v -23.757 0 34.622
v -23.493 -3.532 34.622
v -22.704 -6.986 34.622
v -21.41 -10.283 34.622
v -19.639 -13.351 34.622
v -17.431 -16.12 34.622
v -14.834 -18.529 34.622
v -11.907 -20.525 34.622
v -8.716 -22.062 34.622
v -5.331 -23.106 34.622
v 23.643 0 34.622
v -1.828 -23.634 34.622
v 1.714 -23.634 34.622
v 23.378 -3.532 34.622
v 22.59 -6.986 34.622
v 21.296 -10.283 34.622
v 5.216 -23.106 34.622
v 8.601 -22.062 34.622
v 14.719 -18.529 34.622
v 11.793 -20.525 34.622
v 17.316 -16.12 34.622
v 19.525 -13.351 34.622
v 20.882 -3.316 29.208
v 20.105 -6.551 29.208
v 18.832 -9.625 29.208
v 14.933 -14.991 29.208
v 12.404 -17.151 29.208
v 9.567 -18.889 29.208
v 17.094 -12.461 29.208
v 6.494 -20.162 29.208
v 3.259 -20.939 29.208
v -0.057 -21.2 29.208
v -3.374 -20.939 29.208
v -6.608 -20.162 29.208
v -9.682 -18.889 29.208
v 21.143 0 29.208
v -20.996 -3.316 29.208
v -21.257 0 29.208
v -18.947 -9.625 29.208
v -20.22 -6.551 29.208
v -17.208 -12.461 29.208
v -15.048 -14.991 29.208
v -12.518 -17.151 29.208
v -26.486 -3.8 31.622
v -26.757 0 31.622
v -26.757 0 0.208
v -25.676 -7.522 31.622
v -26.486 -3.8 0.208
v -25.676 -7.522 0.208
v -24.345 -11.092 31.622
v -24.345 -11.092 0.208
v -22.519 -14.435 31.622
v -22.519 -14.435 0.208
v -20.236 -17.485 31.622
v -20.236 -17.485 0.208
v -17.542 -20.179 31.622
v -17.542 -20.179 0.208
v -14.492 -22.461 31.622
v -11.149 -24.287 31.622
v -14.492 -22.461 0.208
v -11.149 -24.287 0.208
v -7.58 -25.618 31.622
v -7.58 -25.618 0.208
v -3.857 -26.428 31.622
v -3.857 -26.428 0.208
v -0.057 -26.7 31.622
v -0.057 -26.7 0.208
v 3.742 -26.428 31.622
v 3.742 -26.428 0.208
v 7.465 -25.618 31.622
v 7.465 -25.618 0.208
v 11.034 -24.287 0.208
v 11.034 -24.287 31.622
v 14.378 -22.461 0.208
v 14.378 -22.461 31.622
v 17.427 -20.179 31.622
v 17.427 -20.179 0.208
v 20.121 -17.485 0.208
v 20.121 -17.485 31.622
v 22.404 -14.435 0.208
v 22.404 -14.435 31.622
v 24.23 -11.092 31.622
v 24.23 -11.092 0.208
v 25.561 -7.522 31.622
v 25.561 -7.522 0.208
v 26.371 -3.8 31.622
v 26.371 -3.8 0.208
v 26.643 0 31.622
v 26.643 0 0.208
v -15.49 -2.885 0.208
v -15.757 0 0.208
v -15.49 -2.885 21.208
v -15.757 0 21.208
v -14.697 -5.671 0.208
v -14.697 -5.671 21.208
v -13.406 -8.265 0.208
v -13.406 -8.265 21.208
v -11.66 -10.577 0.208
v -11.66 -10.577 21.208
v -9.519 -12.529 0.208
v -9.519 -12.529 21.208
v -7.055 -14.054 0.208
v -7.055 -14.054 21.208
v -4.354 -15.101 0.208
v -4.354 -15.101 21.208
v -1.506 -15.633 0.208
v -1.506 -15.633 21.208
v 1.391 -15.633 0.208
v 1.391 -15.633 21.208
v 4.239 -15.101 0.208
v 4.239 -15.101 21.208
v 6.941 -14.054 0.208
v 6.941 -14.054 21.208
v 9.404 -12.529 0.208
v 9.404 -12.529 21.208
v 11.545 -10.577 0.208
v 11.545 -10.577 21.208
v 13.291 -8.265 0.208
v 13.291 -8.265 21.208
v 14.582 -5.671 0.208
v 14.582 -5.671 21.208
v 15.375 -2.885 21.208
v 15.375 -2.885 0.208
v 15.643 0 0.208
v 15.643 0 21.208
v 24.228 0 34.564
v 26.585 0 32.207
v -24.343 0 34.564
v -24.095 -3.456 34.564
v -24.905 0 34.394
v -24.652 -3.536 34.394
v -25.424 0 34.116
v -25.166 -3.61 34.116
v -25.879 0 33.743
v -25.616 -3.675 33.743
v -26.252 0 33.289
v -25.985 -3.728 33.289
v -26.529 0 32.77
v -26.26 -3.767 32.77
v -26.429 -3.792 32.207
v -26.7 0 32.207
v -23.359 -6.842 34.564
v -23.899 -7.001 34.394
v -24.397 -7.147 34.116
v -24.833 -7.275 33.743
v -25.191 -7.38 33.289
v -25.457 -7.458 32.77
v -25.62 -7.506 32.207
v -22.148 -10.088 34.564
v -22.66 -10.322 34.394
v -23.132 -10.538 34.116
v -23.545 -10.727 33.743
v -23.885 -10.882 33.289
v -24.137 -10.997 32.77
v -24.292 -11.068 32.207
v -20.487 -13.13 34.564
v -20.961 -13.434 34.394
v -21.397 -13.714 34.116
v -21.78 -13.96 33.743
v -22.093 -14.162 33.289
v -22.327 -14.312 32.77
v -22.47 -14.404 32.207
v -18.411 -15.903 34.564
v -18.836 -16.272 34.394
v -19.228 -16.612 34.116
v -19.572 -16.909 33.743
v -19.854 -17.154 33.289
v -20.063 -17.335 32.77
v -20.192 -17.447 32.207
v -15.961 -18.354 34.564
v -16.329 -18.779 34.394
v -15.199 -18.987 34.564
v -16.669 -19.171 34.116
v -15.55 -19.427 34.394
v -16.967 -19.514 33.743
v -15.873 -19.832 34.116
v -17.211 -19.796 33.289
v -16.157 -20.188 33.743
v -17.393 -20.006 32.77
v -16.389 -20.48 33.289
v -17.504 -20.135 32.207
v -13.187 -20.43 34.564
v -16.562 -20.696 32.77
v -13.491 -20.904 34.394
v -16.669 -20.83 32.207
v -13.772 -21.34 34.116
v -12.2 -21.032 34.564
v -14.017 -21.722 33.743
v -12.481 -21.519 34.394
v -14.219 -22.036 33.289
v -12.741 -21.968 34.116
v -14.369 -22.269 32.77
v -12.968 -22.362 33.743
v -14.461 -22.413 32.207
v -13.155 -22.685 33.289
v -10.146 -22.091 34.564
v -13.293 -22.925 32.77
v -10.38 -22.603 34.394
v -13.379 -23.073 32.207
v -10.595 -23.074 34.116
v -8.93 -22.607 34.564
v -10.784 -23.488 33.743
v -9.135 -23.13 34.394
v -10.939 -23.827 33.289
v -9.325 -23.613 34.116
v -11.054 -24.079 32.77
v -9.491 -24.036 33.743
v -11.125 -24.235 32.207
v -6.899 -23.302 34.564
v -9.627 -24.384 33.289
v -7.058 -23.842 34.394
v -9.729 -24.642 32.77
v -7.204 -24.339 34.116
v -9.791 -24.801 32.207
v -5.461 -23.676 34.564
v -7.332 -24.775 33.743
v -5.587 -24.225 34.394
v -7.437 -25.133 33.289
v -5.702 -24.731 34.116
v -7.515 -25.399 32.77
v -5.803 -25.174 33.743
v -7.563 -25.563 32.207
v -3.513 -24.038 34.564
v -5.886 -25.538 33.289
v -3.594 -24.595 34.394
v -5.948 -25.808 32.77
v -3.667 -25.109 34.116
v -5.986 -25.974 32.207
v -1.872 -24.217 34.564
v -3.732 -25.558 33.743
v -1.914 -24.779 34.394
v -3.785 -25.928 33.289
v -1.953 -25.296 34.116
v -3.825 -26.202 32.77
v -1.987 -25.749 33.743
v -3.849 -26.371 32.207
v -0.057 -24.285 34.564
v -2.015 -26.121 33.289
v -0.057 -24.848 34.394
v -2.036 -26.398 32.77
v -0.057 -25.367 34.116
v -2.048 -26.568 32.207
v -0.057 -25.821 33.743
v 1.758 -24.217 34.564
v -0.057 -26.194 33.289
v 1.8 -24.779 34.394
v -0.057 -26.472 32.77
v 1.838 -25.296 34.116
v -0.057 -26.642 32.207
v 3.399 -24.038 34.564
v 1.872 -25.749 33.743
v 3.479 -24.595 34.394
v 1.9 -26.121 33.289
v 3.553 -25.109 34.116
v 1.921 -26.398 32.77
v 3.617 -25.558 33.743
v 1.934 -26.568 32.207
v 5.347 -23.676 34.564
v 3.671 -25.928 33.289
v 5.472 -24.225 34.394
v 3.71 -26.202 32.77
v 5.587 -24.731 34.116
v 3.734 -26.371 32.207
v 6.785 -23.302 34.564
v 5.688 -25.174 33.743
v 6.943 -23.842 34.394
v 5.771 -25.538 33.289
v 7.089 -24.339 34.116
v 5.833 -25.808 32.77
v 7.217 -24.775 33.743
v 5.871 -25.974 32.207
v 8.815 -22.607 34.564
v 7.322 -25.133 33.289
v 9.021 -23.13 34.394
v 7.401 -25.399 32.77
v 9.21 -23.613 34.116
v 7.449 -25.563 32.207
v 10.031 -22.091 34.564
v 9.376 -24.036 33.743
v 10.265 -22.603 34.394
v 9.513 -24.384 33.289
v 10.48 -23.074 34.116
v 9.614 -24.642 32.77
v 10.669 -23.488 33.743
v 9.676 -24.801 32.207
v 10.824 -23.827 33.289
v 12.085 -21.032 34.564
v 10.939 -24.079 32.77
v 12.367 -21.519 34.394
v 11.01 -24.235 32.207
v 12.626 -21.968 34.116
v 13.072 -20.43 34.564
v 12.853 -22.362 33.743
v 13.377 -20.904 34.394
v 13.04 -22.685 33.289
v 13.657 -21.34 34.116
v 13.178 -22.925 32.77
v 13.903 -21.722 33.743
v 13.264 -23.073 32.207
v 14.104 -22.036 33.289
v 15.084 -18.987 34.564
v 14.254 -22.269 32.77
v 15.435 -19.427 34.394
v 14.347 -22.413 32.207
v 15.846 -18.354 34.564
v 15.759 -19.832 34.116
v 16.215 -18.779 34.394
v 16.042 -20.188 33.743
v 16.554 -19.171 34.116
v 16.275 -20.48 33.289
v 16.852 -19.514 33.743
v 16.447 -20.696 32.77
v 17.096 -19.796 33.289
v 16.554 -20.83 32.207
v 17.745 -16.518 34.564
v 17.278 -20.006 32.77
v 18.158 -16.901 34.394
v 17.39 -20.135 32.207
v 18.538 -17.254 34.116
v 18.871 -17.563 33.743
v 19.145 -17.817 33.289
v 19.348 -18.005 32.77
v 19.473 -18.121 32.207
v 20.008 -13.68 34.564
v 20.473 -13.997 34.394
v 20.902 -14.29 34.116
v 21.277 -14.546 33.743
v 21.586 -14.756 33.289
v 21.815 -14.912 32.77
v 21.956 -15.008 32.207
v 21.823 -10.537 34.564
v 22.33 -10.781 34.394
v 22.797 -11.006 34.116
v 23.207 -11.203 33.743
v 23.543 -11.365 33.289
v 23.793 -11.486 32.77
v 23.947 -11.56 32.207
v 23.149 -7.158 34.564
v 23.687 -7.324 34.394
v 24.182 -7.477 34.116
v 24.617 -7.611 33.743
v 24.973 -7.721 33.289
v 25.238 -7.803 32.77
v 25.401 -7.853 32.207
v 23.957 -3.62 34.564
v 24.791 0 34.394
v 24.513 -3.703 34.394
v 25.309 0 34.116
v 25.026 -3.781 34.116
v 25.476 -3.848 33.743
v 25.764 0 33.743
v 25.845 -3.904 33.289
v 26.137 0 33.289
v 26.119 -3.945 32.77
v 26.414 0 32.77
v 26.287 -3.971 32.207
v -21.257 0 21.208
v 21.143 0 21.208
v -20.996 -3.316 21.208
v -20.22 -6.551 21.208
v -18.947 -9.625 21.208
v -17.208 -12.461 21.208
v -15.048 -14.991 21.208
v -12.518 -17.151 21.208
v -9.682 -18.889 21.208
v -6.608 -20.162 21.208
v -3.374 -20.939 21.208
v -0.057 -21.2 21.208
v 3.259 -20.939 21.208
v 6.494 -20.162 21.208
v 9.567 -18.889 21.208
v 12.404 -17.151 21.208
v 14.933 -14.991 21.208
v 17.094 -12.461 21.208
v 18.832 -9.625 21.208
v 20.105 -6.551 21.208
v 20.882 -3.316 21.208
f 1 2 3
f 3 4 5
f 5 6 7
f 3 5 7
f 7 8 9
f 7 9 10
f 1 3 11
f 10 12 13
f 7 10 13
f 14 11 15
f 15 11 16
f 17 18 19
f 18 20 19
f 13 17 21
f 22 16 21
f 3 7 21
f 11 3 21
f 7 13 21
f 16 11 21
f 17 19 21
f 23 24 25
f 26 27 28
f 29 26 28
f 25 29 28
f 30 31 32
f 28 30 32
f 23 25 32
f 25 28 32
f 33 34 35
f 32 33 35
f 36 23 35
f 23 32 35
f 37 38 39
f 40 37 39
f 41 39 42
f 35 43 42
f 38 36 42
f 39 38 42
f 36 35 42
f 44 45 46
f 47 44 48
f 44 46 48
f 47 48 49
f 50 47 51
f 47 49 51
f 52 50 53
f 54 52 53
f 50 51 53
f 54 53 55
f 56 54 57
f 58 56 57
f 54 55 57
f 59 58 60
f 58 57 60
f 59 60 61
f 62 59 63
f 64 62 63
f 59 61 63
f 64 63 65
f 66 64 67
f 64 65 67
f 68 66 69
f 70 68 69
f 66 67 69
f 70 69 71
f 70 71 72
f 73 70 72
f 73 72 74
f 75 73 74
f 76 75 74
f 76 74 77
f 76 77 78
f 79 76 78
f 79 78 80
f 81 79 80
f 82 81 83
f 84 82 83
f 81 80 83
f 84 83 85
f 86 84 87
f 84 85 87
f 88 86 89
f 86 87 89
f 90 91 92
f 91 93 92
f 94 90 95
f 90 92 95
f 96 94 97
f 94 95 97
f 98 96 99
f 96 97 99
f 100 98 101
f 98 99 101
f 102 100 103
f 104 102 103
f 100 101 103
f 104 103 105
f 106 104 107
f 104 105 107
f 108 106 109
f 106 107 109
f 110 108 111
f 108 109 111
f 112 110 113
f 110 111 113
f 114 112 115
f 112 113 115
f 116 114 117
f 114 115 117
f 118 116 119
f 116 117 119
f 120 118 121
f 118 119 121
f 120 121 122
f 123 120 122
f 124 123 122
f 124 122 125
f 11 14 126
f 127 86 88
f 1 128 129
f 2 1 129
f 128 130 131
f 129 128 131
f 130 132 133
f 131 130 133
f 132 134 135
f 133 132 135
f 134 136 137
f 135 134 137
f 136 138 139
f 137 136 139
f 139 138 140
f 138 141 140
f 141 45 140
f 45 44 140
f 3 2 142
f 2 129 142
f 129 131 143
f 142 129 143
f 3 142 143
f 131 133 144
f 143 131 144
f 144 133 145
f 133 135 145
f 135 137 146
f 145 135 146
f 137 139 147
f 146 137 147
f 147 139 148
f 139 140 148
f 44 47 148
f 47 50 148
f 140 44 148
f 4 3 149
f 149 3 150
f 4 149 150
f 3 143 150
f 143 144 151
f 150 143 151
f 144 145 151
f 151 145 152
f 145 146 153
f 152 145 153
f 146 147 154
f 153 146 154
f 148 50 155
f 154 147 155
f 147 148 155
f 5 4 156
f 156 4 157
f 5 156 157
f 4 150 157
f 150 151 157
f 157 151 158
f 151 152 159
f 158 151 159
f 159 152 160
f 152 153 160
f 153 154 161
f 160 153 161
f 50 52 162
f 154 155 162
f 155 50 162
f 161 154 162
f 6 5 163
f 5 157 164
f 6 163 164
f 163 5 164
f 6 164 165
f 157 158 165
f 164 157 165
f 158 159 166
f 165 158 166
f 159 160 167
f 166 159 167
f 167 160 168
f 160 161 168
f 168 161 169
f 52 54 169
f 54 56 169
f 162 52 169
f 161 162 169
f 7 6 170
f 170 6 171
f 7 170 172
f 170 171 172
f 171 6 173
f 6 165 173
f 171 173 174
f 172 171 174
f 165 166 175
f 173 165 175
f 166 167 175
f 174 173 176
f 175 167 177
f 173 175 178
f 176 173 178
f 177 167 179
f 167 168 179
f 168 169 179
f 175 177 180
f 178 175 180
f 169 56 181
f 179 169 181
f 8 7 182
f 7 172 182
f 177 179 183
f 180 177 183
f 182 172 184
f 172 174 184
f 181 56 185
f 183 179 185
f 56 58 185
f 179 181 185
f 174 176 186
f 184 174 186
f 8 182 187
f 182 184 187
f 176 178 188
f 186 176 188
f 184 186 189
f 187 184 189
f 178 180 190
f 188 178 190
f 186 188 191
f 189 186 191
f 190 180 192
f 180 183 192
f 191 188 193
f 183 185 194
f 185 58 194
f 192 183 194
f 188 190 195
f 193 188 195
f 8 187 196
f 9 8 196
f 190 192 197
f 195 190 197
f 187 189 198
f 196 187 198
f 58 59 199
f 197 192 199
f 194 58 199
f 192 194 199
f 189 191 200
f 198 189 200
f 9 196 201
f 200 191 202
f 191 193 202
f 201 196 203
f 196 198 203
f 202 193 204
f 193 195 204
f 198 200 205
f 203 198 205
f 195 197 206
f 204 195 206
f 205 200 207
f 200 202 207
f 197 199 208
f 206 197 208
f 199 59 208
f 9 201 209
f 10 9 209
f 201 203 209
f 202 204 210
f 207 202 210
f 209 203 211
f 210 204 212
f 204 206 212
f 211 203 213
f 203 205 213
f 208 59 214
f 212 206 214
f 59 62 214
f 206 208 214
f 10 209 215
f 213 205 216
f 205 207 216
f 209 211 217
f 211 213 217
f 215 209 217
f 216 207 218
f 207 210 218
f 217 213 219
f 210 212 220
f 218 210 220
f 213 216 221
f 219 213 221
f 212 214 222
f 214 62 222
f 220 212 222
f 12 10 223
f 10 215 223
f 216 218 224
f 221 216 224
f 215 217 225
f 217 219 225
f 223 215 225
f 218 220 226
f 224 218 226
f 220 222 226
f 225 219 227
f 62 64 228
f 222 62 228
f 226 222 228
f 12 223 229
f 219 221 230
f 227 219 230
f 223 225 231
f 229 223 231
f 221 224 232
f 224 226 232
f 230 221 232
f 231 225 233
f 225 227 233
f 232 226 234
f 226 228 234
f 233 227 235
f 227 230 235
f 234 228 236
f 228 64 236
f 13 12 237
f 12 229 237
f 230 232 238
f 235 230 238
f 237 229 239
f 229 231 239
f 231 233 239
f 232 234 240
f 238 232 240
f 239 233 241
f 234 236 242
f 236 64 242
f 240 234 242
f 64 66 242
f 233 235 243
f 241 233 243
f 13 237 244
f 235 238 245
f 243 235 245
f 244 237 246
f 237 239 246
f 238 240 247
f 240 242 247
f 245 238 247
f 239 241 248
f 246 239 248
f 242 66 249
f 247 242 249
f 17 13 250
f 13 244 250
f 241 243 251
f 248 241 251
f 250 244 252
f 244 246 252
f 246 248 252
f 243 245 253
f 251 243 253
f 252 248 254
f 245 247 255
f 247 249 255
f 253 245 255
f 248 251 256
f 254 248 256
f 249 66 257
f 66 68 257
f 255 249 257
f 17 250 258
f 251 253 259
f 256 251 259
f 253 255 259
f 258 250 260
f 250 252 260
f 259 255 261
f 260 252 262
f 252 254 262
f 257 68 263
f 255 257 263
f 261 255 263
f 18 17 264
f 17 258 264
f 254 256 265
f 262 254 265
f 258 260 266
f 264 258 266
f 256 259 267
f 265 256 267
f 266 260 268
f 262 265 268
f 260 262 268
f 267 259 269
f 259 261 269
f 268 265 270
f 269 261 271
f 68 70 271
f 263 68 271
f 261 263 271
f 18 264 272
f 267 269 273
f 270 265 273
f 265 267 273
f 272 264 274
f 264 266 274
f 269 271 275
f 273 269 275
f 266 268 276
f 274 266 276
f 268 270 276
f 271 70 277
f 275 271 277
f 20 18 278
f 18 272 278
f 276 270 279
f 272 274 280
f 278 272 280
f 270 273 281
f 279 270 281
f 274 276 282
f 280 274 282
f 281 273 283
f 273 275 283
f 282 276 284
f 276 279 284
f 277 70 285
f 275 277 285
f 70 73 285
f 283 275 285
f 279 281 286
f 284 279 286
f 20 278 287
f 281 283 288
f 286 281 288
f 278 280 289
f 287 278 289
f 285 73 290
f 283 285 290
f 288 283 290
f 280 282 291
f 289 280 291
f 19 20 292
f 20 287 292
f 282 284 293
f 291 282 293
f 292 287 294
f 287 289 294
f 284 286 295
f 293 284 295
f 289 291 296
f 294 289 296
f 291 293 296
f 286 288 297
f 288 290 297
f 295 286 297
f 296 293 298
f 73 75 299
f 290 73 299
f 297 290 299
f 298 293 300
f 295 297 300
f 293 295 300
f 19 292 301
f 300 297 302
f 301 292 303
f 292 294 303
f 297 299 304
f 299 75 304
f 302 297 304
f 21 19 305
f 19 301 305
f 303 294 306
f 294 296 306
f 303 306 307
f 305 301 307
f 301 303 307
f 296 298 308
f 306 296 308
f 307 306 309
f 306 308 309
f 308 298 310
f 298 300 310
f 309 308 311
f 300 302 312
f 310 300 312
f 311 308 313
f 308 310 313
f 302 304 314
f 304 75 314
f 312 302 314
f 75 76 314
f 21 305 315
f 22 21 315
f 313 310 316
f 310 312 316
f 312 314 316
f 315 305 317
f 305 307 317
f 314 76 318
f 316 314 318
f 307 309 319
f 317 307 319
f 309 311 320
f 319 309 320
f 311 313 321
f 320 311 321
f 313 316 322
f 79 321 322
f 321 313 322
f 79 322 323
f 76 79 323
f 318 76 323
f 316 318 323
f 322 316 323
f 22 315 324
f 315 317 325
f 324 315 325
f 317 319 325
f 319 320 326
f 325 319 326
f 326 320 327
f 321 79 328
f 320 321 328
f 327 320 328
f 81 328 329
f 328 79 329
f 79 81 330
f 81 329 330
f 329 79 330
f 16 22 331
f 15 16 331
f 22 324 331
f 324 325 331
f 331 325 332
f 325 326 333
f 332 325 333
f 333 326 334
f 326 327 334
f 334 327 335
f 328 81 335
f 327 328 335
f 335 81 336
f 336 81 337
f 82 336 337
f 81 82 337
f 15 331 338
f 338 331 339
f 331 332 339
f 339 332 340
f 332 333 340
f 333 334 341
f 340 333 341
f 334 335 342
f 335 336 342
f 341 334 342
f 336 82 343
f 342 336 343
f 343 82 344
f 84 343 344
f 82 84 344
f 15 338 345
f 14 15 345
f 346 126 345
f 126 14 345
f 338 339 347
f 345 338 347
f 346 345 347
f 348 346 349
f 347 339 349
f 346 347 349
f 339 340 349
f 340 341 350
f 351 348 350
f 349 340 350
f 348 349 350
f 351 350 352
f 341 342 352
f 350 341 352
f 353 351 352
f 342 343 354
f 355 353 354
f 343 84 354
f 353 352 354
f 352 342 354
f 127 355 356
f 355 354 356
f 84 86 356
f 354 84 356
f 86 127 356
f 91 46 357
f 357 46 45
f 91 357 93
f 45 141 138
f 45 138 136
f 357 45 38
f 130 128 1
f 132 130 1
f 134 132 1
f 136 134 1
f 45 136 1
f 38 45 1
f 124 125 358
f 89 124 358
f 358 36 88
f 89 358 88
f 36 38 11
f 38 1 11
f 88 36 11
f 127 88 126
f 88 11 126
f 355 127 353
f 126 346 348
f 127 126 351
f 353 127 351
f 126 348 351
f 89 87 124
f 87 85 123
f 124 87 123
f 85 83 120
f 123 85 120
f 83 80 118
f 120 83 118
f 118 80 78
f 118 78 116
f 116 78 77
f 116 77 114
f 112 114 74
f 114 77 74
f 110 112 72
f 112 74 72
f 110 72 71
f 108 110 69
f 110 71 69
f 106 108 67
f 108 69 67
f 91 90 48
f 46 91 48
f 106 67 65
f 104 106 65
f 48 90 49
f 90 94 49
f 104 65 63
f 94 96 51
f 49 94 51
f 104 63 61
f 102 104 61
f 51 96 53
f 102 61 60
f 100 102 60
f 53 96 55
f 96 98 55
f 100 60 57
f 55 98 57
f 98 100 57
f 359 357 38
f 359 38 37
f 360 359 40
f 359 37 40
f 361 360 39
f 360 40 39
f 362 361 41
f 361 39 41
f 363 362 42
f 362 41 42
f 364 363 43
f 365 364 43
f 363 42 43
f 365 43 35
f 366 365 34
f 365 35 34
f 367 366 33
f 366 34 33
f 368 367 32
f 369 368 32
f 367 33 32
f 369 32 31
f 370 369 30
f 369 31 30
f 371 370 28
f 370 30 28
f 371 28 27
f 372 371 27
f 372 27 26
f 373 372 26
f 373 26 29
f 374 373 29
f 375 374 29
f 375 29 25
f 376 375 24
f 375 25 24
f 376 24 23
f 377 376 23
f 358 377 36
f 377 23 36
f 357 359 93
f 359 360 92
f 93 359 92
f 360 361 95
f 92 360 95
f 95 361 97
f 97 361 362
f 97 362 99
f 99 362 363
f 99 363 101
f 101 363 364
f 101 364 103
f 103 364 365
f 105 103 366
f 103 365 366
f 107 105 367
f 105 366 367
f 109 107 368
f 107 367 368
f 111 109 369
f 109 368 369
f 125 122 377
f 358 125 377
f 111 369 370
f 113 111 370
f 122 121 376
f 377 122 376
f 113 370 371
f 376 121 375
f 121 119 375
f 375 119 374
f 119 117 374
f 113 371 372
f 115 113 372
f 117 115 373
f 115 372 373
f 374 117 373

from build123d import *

# Parameters (mm, degrees)
F1_ANGLE = 180
F2_R     = 3


with BuildPart() as f1:
    # F0 (on Front) → F1 (revolve)
    with BuildSketch(Plane.XZ):
        Polygon((-26.7573259016, 0.2080155462), (-15.7573259016, 0.2080155462), (-15.7573259016, 21.2080155462), (-21.2573259016, 21.2080155462), (-21.2573259016, 29.2080155462), (-0.0573259016, 29.2080155462), (-0.0573259016, 34.6219648462), (-26.7573259016, 34.6219648462), (-26.7573259016, 29.1219648462), (-26.7573259016, 23.8824076951), (-26.7573259016, 8.0824076951), align=None)
    revolve(axis=Axis((-0.0573259016, 0, 3.4359856569), (0, 0, 1)), revolution_arc=F1_ANGLE)

    # F2
    f2_edges = [f1.edges().sort_by_distance(p)[0] for p in [
        (-0.057326, -26.7, 34.621965),
    ]]
    fillet(f2_edges, radius=F2_R)


solid = f1.part
